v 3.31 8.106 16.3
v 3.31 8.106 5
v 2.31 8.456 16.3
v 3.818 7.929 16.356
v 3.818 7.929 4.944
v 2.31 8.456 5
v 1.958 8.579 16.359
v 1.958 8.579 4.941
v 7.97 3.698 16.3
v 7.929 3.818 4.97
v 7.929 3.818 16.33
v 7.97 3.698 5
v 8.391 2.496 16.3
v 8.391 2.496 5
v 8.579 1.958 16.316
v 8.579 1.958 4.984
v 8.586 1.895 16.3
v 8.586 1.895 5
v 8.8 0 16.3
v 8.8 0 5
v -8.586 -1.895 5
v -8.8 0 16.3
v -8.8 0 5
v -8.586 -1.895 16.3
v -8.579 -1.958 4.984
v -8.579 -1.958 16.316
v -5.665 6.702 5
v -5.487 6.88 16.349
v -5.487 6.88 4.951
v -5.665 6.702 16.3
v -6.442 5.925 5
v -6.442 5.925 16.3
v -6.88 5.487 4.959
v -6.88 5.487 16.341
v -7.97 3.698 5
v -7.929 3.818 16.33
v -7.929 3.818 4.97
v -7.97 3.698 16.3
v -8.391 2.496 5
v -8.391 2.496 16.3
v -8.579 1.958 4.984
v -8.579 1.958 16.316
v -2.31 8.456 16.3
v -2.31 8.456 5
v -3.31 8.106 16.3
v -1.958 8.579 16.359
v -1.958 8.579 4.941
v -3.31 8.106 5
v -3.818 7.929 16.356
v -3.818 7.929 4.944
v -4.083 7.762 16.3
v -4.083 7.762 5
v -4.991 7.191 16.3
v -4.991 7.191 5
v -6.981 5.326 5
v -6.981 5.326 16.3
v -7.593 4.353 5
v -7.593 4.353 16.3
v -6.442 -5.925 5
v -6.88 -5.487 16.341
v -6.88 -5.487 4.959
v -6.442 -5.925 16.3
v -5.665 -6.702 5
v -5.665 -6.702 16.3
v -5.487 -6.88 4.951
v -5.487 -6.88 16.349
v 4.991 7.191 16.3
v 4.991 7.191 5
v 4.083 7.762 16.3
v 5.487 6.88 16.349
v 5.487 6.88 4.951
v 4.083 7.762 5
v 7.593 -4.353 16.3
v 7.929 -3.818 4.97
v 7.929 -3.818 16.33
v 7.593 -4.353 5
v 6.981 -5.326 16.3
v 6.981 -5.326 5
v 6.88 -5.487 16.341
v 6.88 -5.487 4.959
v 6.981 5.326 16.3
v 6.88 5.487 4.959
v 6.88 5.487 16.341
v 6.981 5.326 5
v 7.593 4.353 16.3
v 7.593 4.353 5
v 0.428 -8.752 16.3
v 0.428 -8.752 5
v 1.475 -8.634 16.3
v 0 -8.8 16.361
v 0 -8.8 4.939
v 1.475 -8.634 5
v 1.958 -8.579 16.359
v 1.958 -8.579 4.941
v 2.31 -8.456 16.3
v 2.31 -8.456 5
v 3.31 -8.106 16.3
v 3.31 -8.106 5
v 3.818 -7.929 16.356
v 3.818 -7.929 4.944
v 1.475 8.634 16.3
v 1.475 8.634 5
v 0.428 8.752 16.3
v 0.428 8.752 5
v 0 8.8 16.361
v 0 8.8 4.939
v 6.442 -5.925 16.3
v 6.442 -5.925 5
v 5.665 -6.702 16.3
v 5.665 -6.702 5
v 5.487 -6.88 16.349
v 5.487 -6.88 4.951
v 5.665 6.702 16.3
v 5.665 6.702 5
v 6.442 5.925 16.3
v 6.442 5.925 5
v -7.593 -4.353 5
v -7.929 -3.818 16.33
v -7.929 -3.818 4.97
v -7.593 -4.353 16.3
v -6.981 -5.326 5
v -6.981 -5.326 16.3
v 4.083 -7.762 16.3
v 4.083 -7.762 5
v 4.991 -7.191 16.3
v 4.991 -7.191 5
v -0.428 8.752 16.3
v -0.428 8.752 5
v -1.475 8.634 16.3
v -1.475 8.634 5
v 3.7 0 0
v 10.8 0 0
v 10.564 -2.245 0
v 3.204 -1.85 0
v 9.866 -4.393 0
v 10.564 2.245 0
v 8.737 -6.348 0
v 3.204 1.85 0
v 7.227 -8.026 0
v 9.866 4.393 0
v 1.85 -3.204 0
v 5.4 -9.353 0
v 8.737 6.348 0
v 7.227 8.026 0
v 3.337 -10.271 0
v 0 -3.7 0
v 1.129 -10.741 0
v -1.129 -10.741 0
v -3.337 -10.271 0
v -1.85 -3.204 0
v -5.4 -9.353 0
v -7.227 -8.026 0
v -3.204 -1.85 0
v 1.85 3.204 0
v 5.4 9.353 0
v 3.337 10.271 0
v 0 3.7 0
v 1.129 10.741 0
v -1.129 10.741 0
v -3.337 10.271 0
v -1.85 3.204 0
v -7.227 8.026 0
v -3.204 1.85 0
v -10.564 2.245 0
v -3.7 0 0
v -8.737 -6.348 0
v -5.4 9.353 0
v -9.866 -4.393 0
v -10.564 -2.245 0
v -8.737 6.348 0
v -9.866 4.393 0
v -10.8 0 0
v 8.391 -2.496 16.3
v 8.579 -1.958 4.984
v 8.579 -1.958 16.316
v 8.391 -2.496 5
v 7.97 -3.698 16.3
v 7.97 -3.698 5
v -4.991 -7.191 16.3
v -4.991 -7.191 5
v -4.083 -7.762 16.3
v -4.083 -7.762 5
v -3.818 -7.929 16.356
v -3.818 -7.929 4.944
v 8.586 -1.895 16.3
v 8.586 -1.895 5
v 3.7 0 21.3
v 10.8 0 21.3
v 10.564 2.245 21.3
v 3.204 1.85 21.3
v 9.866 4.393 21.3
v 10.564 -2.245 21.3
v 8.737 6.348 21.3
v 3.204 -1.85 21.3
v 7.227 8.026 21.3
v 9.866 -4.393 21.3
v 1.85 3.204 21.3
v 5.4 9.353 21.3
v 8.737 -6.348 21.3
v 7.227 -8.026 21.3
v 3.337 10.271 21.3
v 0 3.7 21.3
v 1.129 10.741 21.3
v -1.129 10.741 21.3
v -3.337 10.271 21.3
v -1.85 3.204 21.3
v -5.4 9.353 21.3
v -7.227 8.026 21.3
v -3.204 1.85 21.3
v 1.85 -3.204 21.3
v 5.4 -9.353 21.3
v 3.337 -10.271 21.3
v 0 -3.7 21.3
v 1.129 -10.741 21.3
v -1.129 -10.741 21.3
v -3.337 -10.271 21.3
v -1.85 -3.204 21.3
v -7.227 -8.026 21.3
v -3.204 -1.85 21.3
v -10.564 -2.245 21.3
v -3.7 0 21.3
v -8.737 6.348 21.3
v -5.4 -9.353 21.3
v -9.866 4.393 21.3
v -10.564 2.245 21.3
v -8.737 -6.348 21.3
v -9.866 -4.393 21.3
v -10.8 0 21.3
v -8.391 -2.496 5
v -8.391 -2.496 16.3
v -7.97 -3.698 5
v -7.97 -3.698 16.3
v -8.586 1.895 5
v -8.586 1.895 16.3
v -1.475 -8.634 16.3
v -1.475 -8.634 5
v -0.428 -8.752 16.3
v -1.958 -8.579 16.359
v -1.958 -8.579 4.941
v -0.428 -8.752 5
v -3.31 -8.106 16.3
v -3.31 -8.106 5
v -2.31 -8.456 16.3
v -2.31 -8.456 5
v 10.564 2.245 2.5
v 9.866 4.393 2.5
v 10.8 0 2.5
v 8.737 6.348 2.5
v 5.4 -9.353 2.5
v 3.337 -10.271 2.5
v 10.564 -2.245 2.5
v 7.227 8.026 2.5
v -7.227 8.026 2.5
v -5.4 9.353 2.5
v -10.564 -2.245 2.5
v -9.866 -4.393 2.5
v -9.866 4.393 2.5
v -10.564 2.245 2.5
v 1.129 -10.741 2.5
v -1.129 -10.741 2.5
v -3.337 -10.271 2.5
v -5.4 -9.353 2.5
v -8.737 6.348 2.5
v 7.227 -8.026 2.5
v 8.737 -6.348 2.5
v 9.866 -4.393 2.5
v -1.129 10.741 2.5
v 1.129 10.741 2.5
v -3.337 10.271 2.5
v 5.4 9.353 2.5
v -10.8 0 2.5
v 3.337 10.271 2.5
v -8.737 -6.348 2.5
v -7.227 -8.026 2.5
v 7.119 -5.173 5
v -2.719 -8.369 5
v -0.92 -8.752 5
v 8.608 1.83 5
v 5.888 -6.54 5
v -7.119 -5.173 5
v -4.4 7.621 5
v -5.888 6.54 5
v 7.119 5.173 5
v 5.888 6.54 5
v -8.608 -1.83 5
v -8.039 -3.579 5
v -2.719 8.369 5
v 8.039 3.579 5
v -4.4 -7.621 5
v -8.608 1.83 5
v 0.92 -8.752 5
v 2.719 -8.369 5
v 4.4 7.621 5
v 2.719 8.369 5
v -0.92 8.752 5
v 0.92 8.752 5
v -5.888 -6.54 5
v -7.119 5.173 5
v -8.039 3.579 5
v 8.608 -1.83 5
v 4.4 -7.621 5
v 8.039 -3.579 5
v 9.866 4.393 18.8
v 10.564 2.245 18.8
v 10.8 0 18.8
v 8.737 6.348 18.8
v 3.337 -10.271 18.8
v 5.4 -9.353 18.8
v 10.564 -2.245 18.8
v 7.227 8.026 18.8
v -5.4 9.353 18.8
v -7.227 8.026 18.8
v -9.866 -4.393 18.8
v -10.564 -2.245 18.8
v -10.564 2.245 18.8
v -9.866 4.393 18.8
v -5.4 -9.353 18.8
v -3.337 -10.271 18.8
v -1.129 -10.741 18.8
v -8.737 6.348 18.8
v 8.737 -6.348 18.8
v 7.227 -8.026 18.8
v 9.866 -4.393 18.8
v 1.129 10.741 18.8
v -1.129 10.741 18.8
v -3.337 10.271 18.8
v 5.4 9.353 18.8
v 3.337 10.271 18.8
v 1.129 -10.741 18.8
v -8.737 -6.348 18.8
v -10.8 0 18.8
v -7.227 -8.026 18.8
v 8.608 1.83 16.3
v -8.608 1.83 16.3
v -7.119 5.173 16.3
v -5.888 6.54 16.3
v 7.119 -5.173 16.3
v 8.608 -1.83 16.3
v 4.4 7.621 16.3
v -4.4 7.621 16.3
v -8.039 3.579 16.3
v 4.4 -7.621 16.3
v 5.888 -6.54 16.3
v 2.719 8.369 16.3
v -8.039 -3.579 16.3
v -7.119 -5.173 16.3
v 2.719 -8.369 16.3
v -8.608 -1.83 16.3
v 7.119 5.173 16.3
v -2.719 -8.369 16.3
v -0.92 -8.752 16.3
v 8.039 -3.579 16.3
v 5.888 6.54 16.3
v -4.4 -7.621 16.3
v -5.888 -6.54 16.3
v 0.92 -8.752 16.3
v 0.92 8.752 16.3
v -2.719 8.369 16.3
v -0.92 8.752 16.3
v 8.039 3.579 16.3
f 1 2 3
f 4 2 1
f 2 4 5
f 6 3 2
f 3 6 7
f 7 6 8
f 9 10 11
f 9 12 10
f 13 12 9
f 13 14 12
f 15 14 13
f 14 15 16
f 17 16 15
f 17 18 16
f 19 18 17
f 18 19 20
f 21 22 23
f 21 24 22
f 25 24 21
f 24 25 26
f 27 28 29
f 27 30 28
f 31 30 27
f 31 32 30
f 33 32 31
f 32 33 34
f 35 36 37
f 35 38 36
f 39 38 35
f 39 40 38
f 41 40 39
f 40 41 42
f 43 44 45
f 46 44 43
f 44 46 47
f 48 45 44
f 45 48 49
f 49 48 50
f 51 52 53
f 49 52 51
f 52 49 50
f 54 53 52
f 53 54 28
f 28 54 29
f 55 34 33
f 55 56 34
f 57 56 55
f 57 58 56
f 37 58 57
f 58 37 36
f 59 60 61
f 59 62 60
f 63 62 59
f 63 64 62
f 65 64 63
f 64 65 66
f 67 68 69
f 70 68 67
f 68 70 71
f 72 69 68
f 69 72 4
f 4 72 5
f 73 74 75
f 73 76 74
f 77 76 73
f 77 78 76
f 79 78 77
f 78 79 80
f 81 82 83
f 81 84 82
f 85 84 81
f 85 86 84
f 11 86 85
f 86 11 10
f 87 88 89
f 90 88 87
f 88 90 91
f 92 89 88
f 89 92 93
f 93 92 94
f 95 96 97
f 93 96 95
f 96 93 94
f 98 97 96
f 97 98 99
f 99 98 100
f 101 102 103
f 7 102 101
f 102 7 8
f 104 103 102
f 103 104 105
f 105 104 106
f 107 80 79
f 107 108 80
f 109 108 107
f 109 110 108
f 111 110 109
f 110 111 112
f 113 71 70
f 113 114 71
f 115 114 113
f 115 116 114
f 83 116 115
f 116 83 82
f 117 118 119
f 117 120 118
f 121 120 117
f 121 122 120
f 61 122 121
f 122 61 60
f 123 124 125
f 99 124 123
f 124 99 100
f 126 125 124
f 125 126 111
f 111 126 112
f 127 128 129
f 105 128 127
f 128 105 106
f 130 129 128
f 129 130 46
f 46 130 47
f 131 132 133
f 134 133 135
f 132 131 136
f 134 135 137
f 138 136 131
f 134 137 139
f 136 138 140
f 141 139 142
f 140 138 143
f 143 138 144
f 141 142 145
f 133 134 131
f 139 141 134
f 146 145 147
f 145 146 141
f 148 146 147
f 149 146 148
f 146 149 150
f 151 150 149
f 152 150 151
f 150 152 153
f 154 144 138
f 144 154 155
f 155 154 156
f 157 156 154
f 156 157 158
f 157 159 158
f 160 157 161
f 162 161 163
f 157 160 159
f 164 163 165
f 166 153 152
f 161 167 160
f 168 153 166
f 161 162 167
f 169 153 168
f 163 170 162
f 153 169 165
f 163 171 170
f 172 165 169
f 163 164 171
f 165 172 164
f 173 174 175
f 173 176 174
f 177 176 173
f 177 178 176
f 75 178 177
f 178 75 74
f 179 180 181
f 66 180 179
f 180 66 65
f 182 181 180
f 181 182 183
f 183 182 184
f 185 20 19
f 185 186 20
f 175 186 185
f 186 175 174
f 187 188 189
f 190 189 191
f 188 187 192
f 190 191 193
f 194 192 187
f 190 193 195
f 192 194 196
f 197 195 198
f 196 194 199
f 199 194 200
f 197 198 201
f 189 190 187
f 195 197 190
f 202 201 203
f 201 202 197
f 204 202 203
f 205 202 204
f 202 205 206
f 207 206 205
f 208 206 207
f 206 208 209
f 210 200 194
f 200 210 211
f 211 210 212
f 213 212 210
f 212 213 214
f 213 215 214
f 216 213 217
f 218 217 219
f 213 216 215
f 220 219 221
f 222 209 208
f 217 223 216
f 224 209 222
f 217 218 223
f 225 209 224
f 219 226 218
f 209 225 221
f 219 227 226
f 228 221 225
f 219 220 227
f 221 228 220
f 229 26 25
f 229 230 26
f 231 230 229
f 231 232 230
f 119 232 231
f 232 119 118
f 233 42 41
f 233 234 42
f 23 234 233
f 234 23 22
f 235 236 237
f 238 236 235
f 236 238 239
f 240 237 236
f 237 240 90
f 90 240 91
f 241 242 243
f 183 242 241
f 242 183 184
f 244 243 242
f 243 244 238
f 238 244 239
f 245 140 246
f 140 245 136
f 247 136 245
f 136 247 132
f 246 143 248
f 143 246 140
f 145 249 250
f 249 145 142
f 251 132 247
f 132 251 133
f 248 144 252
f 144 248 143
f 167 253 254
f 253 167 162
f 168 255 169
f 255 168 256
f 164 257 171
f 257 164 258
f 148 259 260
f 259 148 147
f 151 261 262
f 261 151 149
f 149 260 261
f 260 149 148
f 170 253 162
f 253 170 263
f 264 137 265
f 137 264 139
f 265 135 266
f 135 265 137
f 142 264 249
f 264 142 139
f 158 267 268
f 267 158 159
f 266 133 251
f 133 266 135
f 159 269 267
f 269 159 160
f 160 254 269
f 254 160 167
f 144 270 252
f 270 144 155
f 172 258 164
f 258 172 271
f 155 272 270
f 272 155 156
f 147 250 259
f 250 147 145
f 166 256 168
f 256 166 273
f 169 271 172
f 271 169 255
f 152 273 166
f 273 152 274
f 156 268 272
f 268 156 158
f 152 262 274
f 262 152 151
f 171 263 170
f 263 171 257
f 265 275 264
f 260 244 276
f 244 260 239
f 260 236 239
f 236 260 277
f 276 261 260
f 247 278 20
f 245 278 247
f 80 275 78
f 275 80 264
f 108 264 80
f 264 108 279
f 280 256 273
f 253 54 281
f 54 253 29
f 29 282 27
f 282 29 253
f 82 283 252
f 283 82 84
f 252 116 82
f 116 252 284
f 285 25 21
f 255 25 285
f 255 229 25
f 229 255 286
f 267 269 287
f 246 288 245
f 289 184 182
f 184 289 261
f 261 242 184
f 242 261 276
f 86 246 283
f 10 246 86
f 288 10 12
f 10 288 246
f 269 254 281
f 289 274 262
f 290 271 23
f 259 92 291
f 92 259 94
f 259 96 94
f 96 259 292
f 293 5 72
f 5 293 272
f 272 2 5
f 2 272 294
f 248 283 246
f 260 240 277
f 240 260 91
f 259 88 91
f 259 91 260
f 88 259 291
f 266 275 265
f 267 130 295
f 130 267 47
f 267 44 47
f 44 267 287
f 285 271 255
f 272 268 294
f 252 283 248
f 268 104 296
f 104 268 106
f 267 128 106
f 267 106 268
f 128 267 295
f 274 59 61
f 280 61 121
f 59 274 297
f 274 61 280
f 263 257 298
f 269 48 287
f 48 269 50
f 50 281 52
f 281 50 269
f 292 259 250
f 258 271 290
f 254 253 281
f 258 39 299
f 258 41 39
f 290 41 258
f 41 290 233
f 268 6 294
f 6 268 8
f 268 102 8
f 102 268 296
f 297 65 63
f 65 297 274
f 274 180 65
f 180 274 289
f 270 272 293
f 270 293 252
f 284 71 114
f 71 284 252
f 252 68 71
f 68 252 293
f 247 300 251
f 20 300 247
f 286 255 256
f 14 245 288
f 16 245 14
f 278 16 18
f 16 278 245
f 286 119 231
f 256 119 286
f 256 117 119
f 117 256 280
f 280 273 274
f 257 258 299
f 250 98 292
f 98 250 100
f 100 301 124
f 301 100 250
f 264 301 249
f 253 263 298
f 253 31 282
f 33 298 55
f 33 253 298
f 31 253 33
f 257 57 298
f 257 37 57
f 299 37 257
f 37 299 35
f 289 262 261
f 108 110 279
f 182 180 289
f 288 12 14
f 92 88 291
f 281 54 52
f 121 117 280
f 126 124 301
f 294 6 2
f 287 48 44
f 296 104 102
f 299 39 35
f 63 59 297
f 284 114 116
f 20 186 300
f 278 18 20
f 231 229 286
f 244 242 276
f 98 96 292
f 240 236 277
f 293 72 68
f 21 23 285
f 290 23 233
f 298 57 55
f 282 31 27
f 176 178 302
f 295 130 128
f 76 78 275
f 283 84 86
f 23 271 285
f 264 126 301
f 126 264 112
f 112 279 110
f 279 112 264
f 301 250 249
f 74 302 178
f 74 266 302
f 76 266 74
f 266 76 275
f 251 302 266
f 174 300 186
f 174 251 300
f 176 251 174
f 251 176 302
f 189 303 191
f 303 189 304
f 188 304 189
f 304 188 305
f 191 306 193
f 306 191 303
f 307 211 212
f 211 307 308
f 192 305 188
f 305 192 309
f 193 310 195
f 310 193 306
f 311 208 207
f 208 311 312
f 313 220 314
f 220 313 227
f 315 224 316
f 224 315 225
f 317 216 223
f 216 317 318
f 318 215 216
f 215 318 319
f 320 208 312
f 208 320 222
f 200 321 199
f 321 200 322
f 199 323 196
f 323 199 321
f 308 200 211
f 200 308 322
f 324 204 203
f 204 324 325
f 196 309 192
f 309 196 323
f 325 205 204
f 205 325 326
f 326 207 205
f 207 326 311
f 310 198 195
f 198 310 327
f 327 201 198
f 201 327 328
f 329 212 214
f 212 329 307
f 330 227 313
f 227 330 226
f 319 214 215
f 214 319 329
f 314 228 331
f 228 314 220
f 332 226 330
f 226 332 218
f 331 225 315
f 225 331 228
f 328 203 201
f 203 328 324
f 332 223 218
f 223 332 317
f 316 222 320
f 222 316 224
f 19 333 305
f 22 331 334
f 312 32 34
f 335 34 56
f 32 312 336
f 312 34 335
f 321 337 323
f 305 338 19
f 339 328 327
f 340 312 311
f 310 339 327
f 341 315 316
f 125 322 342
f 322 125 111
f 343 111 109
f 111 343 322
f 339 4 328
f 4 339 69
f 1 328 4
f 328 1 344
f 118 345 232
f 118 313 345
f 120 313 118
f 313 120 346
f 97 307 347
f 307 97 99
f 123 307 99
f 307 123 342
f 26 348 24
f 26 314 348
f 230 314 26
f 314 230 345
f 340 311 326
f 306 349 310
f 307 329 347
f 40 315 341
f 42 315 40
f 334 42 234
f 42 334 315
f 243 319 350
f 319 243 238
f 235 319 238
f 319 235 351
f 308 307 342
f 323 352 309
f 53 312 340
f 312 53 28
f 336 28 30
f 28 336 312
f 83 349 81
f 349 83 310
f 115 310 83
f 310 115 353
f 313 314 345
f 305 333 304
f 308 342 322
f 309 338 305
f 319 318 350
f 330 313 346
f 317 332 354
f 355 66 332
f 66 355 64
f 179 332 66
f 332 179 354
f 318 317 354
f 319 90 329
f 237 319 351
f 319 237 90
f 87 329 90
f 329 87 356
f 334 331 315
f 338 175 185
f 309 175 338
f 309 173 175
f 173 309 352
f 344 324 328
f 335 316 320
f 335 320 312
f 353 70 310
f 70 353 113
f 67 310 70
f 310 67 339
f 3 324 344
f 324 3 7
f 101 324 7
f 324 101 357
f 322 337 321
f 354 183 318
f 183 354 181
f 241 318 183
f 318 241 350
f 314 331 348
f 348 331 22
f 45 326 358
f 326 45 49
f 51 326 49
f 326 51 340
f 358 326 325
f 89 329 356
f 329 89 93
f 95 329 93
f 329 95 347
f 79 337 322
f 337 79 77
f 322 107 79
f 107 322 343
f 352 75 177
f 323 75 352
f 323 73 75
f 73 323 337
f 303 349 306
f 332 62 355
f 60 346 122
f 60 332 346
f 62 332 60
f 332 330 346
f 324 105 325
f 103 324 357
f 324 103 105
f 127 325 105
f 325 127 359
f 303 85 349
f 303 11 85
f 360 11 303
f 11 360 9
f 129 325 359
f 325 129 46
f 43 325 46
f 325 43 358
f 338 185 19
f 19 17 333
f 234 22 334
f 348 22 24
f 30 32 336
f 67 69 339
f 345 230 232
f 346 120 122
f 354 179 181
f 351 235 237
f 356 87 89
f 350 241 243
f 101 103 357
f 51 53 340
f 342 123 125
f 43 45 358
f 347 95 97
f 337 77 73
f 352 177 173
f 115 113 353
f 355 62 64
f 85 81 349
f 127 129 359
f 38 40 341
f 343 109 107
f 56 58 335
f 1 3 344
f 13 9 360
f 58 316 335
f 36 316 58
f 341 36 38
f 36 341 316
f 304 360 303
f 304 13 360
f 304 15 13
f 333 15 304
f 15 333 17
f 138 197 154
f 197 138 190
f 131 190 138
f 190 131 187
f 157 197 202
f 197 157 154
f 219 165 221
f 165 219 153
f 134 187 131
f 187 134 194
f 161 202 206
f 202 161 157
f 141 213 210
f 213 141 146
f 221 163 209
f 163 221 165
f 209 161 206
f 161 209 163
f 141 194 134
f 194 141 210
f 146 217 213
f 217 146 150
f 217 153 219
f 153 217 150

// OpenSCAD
/*
Create a thread spool
Created by Mike Creuzer - Mike@Creuzer.com 20120820
Updated 1/14/2013 for Customizer optimization
*/

// Parameters are in mm

// The radius of the spool (half the diameter)
spool_radius = 8.8; // 17.6 / 2 for the toy I used
// The height of the spool
spool_height = 21.3;

// The top and bottom radius
lip_radius = 10.8; // 21.6 / 2 for the toy I used
// The height of the top and bottom
lip_height = 2.5;

// The radius of the whole in the center
spindle_radius = 3.7; // 7.4/2


difference()
{
	union() // Make the spool
	{
		cylinder(r=spool_radius, h=spool_height);
		cylinder(r=lip_radius, h=lip_height);
		translate([0,0,lip_height]) cylinder(r1=lip_radius, r2 = spool_radius, h=lip_height);
		translate([0,0,spool_height-lip_height]) cylinder(r=lip_radius, h=lip_height);
		translate([0,0,spool_height-lip_height-lip_height]) cylinder(r2=lip_radius, r1 = spool_radius, h=lip_height);
	}
	cylinder(r=spindle_radius, h=spool_height); // The hole down the middle
}
